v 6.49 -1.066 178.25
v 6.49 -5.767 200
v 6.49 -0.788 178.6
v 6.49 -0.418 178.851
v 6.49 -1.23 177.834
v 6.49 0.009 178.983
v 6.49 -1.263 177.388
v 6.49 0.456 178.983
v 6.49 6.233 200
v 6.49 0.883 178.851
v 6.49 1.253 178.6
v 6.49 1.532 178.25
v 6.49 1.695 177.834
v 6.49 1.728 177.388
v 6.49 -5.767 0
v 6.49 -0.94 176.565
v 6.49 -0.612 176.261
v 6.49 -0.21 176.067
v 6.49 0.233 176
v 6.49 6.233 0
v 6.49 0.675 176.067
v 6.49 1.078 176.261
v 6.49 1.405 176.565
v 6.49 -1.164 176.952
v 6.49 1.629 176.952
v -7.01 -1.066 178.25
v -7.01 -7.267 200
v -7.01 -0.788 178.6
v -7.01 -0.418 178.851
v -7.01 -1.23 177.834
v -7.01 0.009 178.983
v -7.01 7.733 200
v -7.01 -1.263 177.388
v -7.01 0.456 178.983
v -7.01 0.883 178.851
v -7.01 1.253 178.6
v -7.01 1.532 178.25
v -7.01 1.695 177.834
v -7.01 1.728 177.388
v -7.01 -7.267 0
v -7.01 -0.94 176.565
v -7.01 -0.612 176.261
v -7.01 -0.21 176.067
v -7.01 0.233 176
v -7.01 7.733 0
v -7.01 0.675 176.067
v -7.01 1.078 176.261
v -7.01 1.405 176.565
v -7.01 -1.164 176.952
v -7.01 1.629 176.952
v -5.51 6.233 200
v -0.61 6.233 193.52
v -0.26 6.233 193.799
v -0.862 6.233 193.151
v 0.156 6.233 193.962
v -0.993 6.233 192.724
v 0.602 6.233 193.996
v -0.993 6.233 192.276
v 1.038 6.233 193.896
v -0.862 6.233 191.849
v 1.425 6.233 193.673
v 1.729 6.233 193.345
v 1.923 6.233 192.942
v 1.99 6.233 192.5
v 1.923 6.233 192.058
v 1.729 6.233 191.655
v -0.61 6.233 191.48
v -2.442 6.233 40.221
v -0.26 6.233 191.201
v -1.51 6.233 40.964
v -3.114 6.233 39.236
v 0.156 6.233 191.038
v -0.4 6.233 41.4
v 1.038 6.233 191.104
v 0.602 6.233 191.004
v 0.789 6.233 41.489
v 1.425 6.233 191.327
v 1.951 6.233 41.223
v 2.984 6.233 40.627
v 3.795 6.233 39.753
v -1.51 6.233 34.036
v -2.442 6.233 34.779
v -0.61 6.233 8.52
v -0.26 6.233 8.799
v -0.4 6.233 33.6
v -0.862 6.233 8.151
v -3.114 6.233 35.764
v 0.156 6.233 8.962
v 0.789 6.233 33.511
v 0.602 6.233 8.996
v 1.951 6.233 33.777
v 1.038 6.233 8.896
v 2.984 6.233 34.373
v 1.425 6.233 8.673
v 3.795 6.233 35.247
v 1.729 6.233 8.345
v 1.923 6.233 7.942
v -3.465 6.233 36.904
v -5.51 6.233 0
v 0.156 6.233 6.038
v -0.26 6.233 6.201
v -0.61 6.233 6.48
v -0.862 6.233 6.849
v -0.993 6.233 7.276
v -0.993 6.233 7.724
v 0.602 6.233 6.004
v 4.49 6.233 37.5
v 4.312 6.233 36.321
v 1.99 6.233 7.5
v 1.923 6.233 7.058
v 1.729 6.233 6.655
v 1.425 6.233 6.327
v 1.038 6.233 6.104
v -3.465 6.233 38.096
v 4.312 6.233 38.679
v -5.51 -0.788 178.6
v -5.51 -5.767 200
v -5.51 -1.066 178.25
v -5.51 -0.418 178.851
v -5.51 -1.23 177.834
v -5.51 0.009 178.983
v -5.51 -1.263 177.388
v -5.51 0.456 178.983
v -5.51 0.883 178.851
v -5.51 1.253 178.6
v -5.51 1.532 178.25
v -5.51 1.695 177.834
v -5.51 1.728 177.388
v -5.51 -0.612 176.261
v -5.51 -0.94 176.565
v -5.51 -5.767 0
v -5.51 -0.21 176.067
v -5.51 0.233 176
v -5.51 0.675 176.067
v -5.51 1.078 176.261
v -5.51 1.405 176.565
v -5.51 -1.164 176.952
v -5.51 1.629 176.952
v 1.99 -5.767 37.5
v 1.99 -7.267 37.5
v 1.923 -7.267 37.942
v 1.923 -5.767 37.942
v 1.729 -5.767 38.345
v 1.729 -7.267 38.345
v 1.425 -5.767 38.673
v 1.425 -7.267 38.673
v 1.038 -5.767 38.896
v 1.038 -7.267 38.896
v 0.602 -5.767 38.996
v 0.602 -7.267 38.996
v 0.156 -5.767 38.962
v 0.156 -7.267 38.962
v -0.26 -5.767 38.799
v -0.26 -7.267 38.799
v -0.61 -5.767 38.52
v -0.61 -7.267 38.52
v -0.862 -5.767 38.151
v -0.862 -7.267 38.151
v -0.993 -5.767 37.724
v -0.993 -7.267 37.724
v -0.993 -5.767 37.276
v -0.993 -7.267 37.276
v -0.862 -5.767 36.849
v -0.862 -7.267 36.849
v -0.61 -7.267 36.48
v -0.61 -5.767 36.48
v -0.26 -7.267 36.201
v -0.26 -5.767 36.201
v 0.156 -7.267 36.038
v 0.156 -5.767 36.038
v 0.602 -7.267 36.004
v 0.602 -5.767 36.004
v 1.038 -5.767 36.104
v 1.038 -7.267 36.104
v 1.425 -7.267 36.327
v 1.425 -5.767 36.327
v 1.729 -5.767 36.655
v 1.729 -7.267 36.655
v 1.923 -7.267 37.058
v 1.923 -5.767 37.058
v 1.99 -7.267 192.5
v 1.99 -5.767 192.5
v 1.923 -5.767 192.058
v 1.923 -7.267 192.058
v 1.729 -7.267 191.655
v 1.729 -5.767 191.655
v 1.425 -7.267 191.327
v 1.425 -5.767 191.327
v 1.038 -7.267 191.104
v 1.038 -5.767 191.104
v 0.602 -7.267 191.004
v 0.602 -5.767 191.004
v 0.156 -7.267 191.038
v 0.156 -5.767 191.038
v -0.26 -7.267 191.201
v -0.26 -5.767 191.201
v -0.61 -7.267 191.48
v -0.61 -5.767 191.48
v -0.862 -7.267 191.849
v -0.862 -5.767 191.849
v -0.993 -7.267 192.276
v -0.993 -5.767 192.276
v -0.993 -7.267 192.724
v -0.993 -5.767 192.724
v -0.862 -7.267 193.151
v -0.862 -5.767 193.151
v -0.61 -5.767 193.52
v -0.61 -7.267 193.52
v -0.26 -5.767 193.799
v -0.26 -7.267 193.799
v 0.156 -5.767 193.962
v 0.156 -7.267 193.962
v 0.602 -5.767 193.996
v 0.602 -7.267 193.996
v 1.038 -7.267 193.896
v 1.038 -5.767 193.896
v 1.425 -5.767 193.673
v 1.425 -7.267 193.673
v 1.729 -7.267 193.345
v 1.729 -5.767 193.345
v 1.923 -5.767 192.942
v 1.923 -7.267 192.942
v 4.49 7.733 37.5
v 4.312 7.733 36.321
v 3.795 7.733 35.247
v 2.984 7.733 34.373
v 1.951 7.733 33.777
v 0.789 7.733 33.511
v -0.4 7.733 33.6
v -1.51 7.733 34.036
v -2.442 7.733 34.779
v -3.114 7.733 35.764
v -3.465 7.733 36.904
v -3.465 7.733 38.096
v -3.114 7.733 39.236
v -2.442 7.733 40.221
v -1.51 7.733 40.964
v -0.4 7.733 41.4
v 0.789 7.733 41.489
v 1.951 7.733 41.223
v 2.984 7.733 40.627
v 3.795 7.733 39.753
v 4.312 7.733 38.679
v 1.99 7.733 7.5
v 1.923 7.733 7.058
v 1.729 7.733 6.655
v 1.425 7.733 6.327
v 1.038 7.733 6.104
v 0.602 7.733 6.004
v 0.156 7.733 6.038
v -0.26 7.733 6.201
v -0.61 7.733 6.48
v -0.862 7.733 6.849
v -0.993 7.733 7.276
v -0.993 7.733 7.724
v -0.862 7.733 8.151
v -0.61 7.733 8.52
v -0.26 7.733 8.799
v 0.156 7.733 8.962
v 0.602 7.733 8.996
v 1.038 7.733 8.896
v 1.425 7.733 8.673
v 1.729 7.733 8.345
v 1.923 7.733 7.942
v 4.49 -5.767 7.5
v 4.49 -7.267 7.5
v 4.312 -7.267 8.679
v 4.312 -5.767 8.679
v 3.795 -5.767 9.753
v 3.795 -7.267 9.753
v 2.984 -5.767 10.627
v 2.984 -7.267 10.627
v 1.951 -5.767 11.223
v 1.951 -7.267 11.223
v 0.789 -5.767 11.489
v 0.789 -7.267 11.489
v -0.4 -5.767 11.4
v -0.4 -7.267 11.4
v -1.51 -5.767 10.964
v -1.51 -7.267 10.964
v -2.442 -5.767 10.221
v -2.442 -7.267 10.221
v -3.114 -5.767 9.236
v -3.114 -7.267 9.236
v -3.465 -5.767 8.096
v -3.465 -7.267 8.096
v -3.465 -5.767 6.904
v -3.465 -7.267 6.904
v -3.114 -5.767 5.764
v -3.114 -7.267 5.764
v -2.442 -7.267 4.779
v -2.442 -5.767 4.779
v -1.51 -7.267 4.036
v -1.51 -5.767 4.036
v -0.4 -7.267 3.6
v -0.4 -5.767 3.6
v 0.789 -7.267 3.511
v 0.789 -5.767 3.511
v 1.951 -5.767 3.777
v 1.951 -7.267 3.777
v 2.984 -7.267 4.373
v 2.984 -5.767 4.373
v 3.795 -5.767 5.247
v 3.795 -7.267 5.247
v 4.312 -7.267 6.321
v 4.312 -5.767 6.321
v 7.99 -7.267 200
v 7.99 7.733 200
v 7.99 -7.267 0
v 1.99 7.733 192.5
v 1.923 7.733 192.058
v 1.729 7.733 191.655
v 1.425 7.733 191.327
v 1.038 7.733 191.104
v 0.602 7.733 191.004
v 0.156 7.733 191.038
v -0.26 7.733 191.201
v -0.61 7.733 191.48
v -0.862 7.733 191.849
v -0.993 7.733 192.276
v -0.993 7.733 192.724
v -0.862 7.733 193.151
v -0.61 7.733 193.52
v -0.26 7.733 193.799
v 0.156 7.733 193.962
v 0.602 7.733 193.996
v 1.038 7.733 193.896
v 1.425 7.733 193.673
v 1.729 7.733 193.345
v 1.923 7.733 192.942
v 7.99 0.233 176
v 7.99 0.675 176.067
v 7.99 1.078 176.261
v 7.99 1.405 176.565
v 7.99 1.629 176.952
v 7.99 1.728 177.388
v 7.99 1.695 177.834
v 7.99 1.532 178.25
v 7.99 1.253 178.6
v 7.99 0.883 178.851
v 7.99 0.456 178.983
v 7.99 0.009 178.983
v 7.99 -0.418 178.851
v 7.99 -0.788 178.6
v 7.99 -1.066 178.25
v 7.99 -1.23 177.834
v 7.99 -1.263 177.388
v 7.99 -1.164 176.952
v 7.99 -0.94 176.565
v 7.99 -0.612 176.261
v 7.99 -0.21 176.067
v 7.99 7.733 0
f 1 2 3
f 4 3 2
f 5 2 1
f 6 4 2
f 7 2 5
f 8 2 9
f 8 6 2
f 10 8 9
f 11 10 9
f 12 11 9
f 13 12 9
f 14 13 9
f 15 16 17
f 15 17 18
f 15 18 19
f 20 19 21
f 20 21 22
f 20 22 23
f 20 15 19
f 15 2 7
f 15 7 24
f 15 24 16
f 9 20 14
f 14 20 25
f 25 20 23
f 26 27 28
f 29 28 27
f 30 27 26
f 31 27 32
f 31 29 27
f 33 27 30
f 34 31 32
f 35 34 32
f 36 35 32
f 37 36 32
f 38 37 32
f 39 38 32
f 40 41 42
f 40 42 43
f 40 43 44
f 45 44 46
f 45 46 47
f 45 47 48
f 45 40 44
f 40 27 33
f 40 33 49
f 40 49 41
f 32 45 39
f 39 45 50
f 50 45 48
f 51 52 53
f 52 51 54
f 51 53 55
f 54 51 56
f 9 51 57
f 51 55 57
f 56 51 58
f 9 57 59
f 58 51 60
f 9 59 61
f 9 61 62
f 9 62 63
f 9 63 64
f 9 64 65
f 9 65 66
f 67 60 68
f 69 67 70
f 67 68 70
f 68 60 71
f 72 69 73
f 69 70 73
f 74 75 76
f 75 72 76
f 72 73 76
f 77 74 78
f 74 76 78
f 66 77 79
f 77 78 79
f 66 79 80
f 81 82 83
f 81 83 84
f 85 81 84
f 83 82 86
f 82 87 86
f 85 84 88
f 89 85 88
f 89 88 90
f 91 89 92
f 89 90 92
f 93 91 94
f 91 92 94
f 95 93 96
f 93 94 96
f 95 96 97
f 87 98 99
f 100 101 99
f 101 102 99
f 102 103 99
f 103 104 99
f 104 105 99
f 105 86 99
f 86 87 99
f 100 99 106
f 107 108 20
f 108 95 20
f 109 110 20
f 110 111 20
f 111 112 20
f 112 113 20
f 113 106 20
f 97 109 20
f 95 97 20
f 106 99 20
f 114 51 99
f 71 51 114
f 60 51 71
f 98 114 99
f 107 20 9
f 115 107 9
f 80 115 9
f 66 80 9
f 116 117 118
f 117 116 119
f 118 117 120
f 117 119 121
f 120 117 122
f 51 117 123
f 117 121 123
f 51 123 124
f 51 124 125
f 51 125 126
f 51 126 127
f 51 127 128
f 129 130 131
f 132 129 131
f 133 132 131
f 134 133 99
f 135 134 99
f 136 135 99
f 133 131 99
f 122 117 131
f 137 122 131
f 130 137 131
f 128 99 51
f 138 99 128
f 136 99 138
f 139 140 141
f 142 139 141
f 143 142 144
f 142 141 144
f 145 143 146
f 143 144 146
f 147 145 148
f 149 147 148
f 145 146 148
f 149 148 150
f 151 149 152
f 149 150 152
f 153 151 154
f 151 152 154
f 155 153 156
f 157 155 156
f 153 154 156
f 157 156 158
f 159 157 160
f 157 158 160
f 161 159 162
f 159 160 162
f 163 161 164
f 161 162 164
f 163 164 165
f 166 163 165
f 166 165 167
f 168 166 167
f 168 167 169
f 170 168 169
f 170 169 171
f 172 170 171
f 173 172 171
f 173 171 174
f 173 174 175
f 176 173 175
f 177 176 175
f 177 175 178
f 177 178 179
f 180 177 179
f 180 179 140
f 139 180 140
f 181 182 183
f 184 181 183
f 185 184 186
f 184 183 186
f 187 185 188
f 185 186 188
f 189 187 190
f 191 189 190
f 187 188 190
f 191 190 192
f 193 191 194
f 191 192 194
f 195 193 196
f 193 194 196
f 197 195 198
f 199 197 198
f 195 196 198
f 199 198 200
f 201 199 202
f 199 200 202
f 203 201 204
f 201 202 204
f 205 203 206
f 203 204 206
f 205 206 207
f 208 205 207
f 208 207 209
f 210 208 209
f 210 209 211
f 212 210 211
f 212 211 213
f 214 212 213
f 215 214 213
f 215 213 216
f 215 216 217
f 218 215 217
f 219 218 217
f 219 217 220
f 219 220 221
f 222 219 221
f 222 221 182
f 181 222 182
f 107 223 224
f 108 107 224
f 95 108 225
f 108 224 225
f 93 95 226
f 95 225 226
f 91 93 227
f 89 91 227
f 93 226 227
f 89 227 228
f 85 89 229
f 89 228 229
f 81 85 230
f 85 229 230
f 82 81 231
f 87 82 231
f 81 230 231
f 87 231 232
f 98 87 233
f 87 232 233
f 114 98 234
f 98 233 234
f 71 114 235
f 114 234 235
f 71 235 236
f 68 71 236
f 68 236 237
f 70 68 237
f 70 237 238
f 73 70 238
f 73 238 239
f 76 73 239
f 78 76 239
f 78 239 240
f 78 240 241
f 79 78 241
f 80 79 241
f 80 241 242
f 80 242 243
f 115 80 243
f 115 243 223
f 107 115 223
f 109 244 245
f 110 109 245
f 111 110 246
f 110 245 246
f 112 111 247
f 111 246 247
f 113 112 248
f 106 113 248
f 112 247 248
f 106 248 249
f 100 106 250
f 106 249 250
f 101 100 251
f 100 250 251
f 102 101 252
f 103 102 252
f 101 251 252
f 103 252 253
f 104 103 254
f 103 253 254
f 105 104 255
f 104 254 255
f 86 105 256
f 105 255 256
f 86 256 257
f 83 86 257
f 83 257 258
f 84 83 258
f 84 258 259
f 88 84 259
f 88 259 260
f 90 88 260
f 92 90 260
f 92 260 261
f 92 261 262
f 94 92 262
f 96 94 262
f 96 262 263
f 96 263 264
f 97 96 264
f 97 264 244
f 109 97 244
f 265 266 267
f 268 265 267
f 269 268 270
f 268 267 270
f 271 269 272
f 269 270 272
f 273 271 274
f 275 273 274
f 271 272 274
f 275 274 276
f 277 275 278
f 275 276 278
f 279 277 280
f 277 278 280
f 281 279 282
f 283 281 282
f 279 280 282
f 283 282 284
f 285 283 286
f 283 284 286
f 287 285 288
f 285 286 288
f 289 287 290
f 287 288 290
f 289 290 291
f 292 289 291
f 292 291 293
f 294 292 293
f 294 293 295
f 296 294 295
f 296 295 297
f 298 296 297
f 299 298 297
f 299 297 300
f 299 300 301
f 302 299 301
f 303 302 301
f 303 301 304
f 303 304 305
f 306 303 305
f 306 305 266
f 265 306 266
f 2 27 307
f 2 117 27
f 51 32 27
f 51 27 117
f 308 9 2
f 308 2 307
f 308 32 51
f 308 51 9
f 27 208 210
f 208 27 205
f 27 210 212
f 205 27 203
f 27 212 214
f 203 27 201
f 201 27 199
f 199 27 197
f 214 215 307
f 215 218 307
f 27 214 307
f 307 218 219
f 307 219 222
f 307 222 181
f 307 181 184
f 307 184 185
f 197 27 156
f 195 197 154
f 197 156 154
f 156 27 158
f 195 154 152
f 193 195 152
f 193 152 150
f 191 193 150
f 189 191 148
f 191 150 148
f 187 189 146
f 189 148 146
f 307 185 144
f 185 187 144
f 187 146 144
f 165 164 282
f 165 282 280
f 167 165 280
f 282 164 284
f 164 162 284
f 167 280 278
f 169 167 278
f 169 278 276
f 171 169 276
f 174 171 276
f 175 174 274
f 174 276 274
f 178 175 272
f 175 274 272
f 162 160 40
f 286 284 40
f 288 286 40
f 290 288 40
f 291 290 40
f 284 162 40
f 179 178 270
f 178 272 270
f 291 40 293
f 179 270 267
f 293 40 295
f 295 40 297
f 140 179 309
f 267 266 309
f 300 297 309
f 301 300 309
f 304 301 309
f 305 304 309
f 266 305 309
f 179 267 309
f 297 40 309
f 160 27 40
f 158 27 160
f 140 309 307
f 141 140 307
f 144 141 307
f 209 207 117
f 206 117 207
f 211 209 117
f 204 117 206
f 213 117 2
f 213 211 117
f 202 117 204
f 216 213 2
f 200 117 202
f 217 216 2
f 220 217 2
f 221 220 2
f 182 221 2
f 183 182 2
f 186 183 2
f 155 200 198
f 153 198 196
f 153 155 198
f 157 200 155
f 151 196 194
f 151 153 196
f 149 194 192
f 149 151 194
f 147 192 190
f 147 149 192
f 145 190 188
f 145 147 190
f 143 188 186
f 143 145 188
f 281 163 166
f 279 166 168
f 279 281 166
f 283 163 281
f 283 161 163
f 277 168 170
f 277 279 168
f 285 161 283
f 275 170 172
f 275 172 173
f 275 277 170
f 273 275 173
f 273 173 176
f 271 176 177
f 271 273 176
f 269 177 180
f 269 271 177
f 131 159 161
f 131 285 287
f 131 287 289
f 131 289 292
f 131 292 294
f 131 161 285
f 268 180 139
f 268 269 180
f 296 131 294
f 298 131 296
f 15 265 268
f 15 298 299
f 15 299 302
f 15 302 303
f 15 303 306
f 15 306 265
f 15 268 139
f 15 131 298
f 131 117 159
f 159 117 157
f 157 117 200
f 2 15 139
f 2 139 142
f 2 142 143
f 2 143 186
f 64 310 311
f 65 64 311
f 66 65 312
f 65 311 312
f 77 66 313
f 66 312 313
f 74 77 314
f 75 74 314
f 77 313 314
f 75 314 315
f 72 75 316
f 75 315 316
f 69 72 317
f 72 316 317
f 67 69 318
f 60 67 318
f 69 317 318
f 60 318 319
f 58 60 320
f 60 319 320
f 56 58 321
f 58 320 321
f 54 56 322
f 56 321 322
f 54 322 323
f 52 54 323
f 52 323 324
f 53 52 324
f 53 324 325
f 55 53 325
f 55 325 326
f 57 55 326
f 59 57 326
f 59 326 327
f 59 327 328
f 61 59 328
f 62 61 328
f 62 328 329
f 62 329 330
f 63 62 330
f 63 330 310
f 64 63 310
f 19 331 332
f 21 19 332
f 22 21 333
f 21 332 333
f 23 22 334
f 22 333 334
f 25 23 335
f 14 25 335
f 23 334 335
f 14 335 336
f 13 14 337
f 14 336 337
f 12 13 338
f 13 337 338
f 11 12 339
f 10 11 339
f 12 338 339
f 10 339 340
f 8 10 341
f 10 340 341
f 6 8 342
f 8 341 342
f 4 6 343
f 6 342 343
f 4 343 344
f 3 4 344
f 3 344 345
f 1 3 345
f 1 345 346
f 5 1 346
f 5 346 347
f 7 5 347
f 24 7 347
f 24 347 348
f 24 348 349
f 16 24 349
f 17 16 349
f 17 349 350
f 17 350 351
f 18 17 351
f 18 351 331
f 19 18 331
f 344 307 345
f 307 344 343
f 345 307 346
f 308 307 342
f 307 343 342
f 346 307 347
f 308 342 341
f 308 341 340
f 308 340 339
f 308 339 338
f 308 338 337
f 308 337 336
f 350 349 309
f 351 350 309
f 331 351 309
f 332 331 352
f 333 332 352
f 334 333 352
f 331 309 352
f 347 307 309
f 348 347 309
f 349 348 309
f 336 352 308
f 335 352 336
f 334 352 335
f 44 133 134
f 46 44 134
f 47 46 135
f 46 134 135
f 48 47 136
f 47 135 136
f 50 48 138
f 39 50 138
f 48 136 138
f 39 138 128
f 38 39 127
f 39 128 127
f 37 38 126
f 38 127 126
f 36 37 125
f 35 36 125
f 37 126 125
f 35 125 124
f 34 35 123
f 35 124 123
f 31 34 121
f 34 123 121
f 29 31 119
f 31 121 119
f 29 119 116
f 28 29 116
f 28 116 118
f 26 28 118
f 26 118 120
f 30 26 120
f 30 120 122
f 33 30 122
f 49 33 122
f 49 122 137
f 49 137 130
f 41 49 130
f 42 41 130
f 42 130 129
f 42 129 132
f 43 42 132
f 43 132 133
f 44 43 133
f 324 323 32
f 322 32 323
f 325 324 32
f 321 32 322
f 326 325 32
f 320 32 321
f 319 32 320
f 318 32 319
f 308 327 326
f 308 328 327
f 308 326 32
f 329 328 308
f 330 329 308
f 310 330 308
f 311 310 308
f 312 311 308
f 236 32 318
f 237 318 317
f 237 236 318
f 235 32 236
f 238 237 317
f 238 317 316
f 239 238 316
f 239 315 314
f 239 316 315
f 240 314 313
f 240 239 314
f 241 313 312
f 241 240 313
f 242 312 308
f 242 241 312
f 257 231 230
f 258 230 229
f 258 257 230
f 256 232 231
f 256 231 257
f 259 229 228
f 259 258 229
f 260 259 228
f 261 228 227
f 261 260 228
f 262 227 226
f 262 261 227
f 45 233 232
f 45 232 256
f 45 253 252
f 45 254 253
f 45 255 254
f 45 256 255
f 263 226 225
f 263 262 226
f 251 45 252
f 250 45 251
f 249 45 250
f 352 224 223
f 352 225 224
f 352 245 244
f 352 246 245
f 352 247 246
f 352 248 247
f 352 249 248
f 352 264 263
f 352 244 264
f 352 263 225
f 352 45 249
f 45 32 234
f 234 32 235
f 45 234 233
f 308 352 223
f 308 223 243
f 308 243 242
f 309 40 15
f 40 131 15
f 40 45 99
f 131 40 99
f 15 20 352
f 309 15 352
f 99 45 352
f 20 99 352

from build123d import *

# Parameters (mm, degrees)
SKETCH_1_W          = 15
SKETCH_1_H          = 15
SKETCH_1_W_2        = 12
SKETCH_1_H_2        = 12
EXTRUDE_2_DEPTH     = 200
SKETCH_2_R          = 1.5
CUT_EXTRUDE_1_DEPTH = 15
SKETCH_3_R          = 1.5
CUT_EXTRUDE_2_DEPTH = 15
SKETCH_4_R          = 1.5
SKETCH_4_R_2        = 4
CUT_EXTRUDE_6_DEPTH = 10
SKETCH_6_R          = 1.5
SKETCH_6_R_2        = 4
CUT_EXTRUDE_7_DEPTH = 10


with BuildPart() as part:
    # ｽｹｯﾁ1 → ﾎﾞｽ - 押し出し2 (new body)
    with BuildSketch(Plane.XY):
        with Locations((0.489915859, 0.232626086)):
            Rectangle(SKETCH_1_W, SKETCH_1_H)
        with Locations((0.489915859, 0.232626086)):
            Rectangle(SKETCH_1_W_2, SKETCH_1_H_2, mode=Mode.SUBTRACT)
    extrude(amount=EXTRUDE_2_DEPTH)

    # ｽｹｯﾁ2 → ｶｯﾄ - 押し出し1 (cut)
    with BuildSketch(Plane(origin=(0, 7.732626086, 0), x_dir=(1, 0, 0), z_dir=(0, 1, 0))):
        with Locations((0.489915859, -192.5)):
            Circle(SKETCH_2_R)
    extrude(amount=-CUT_EXTRUDE_1_DEPTH, mode=Mode.SUBTRACT)

    # ｽｹｯﾁ3 → ｶｯﾄ - 押し出し2 (cut)
    with BuildSketch(Plane(origin=(7.989915859, 0, 0), x_dir=(0, 0, -1), z_dir=(1, 0, 0))):
        with Locations((-177.5, 0.232626086)):
            Circle(SKETCH_3_R)
    extrude(amount=-CUT_EXTRUDE_2_DEPTH, mode=Mode.SUBTRACT)

    # ｽｹｯﾁ4 → ｶｯﾄ - 押し出し6 (cut)
    with BuildSketch(Plane(origin=(0, 7.732626086, 0), x_dir=(1, 0, 0), z_dir=(0, 1, 0))):
        with Locations((0.489915859, -7.5)):
            Circle(SKETCH_4_R)
        with Locations((0.489915859, -37.5)):
            Circle(SKETCH_4_R_2)
    extrude(amount=-CUT_EXTRUDE_6_DEPTH, mode=Mode.SUBTRACT)

    # ｽｹｯﾁ6 → ｶｯﾄ - 押し出し7 (cut)
    with BuildSketch(Plane.XZ.offset(7.267373914)):
        with Locations((0.489915859, 37.5)):
            Circle(SKETCH_6_R)
        with Locations((0.489915859, 7.5)):
            Circle(SKETCH_6_R_2)
    extrude(amount=-CUT_EXTRUDE_7_DEPTH, mode=Mode.SUBTRACT)


solid = part.part
